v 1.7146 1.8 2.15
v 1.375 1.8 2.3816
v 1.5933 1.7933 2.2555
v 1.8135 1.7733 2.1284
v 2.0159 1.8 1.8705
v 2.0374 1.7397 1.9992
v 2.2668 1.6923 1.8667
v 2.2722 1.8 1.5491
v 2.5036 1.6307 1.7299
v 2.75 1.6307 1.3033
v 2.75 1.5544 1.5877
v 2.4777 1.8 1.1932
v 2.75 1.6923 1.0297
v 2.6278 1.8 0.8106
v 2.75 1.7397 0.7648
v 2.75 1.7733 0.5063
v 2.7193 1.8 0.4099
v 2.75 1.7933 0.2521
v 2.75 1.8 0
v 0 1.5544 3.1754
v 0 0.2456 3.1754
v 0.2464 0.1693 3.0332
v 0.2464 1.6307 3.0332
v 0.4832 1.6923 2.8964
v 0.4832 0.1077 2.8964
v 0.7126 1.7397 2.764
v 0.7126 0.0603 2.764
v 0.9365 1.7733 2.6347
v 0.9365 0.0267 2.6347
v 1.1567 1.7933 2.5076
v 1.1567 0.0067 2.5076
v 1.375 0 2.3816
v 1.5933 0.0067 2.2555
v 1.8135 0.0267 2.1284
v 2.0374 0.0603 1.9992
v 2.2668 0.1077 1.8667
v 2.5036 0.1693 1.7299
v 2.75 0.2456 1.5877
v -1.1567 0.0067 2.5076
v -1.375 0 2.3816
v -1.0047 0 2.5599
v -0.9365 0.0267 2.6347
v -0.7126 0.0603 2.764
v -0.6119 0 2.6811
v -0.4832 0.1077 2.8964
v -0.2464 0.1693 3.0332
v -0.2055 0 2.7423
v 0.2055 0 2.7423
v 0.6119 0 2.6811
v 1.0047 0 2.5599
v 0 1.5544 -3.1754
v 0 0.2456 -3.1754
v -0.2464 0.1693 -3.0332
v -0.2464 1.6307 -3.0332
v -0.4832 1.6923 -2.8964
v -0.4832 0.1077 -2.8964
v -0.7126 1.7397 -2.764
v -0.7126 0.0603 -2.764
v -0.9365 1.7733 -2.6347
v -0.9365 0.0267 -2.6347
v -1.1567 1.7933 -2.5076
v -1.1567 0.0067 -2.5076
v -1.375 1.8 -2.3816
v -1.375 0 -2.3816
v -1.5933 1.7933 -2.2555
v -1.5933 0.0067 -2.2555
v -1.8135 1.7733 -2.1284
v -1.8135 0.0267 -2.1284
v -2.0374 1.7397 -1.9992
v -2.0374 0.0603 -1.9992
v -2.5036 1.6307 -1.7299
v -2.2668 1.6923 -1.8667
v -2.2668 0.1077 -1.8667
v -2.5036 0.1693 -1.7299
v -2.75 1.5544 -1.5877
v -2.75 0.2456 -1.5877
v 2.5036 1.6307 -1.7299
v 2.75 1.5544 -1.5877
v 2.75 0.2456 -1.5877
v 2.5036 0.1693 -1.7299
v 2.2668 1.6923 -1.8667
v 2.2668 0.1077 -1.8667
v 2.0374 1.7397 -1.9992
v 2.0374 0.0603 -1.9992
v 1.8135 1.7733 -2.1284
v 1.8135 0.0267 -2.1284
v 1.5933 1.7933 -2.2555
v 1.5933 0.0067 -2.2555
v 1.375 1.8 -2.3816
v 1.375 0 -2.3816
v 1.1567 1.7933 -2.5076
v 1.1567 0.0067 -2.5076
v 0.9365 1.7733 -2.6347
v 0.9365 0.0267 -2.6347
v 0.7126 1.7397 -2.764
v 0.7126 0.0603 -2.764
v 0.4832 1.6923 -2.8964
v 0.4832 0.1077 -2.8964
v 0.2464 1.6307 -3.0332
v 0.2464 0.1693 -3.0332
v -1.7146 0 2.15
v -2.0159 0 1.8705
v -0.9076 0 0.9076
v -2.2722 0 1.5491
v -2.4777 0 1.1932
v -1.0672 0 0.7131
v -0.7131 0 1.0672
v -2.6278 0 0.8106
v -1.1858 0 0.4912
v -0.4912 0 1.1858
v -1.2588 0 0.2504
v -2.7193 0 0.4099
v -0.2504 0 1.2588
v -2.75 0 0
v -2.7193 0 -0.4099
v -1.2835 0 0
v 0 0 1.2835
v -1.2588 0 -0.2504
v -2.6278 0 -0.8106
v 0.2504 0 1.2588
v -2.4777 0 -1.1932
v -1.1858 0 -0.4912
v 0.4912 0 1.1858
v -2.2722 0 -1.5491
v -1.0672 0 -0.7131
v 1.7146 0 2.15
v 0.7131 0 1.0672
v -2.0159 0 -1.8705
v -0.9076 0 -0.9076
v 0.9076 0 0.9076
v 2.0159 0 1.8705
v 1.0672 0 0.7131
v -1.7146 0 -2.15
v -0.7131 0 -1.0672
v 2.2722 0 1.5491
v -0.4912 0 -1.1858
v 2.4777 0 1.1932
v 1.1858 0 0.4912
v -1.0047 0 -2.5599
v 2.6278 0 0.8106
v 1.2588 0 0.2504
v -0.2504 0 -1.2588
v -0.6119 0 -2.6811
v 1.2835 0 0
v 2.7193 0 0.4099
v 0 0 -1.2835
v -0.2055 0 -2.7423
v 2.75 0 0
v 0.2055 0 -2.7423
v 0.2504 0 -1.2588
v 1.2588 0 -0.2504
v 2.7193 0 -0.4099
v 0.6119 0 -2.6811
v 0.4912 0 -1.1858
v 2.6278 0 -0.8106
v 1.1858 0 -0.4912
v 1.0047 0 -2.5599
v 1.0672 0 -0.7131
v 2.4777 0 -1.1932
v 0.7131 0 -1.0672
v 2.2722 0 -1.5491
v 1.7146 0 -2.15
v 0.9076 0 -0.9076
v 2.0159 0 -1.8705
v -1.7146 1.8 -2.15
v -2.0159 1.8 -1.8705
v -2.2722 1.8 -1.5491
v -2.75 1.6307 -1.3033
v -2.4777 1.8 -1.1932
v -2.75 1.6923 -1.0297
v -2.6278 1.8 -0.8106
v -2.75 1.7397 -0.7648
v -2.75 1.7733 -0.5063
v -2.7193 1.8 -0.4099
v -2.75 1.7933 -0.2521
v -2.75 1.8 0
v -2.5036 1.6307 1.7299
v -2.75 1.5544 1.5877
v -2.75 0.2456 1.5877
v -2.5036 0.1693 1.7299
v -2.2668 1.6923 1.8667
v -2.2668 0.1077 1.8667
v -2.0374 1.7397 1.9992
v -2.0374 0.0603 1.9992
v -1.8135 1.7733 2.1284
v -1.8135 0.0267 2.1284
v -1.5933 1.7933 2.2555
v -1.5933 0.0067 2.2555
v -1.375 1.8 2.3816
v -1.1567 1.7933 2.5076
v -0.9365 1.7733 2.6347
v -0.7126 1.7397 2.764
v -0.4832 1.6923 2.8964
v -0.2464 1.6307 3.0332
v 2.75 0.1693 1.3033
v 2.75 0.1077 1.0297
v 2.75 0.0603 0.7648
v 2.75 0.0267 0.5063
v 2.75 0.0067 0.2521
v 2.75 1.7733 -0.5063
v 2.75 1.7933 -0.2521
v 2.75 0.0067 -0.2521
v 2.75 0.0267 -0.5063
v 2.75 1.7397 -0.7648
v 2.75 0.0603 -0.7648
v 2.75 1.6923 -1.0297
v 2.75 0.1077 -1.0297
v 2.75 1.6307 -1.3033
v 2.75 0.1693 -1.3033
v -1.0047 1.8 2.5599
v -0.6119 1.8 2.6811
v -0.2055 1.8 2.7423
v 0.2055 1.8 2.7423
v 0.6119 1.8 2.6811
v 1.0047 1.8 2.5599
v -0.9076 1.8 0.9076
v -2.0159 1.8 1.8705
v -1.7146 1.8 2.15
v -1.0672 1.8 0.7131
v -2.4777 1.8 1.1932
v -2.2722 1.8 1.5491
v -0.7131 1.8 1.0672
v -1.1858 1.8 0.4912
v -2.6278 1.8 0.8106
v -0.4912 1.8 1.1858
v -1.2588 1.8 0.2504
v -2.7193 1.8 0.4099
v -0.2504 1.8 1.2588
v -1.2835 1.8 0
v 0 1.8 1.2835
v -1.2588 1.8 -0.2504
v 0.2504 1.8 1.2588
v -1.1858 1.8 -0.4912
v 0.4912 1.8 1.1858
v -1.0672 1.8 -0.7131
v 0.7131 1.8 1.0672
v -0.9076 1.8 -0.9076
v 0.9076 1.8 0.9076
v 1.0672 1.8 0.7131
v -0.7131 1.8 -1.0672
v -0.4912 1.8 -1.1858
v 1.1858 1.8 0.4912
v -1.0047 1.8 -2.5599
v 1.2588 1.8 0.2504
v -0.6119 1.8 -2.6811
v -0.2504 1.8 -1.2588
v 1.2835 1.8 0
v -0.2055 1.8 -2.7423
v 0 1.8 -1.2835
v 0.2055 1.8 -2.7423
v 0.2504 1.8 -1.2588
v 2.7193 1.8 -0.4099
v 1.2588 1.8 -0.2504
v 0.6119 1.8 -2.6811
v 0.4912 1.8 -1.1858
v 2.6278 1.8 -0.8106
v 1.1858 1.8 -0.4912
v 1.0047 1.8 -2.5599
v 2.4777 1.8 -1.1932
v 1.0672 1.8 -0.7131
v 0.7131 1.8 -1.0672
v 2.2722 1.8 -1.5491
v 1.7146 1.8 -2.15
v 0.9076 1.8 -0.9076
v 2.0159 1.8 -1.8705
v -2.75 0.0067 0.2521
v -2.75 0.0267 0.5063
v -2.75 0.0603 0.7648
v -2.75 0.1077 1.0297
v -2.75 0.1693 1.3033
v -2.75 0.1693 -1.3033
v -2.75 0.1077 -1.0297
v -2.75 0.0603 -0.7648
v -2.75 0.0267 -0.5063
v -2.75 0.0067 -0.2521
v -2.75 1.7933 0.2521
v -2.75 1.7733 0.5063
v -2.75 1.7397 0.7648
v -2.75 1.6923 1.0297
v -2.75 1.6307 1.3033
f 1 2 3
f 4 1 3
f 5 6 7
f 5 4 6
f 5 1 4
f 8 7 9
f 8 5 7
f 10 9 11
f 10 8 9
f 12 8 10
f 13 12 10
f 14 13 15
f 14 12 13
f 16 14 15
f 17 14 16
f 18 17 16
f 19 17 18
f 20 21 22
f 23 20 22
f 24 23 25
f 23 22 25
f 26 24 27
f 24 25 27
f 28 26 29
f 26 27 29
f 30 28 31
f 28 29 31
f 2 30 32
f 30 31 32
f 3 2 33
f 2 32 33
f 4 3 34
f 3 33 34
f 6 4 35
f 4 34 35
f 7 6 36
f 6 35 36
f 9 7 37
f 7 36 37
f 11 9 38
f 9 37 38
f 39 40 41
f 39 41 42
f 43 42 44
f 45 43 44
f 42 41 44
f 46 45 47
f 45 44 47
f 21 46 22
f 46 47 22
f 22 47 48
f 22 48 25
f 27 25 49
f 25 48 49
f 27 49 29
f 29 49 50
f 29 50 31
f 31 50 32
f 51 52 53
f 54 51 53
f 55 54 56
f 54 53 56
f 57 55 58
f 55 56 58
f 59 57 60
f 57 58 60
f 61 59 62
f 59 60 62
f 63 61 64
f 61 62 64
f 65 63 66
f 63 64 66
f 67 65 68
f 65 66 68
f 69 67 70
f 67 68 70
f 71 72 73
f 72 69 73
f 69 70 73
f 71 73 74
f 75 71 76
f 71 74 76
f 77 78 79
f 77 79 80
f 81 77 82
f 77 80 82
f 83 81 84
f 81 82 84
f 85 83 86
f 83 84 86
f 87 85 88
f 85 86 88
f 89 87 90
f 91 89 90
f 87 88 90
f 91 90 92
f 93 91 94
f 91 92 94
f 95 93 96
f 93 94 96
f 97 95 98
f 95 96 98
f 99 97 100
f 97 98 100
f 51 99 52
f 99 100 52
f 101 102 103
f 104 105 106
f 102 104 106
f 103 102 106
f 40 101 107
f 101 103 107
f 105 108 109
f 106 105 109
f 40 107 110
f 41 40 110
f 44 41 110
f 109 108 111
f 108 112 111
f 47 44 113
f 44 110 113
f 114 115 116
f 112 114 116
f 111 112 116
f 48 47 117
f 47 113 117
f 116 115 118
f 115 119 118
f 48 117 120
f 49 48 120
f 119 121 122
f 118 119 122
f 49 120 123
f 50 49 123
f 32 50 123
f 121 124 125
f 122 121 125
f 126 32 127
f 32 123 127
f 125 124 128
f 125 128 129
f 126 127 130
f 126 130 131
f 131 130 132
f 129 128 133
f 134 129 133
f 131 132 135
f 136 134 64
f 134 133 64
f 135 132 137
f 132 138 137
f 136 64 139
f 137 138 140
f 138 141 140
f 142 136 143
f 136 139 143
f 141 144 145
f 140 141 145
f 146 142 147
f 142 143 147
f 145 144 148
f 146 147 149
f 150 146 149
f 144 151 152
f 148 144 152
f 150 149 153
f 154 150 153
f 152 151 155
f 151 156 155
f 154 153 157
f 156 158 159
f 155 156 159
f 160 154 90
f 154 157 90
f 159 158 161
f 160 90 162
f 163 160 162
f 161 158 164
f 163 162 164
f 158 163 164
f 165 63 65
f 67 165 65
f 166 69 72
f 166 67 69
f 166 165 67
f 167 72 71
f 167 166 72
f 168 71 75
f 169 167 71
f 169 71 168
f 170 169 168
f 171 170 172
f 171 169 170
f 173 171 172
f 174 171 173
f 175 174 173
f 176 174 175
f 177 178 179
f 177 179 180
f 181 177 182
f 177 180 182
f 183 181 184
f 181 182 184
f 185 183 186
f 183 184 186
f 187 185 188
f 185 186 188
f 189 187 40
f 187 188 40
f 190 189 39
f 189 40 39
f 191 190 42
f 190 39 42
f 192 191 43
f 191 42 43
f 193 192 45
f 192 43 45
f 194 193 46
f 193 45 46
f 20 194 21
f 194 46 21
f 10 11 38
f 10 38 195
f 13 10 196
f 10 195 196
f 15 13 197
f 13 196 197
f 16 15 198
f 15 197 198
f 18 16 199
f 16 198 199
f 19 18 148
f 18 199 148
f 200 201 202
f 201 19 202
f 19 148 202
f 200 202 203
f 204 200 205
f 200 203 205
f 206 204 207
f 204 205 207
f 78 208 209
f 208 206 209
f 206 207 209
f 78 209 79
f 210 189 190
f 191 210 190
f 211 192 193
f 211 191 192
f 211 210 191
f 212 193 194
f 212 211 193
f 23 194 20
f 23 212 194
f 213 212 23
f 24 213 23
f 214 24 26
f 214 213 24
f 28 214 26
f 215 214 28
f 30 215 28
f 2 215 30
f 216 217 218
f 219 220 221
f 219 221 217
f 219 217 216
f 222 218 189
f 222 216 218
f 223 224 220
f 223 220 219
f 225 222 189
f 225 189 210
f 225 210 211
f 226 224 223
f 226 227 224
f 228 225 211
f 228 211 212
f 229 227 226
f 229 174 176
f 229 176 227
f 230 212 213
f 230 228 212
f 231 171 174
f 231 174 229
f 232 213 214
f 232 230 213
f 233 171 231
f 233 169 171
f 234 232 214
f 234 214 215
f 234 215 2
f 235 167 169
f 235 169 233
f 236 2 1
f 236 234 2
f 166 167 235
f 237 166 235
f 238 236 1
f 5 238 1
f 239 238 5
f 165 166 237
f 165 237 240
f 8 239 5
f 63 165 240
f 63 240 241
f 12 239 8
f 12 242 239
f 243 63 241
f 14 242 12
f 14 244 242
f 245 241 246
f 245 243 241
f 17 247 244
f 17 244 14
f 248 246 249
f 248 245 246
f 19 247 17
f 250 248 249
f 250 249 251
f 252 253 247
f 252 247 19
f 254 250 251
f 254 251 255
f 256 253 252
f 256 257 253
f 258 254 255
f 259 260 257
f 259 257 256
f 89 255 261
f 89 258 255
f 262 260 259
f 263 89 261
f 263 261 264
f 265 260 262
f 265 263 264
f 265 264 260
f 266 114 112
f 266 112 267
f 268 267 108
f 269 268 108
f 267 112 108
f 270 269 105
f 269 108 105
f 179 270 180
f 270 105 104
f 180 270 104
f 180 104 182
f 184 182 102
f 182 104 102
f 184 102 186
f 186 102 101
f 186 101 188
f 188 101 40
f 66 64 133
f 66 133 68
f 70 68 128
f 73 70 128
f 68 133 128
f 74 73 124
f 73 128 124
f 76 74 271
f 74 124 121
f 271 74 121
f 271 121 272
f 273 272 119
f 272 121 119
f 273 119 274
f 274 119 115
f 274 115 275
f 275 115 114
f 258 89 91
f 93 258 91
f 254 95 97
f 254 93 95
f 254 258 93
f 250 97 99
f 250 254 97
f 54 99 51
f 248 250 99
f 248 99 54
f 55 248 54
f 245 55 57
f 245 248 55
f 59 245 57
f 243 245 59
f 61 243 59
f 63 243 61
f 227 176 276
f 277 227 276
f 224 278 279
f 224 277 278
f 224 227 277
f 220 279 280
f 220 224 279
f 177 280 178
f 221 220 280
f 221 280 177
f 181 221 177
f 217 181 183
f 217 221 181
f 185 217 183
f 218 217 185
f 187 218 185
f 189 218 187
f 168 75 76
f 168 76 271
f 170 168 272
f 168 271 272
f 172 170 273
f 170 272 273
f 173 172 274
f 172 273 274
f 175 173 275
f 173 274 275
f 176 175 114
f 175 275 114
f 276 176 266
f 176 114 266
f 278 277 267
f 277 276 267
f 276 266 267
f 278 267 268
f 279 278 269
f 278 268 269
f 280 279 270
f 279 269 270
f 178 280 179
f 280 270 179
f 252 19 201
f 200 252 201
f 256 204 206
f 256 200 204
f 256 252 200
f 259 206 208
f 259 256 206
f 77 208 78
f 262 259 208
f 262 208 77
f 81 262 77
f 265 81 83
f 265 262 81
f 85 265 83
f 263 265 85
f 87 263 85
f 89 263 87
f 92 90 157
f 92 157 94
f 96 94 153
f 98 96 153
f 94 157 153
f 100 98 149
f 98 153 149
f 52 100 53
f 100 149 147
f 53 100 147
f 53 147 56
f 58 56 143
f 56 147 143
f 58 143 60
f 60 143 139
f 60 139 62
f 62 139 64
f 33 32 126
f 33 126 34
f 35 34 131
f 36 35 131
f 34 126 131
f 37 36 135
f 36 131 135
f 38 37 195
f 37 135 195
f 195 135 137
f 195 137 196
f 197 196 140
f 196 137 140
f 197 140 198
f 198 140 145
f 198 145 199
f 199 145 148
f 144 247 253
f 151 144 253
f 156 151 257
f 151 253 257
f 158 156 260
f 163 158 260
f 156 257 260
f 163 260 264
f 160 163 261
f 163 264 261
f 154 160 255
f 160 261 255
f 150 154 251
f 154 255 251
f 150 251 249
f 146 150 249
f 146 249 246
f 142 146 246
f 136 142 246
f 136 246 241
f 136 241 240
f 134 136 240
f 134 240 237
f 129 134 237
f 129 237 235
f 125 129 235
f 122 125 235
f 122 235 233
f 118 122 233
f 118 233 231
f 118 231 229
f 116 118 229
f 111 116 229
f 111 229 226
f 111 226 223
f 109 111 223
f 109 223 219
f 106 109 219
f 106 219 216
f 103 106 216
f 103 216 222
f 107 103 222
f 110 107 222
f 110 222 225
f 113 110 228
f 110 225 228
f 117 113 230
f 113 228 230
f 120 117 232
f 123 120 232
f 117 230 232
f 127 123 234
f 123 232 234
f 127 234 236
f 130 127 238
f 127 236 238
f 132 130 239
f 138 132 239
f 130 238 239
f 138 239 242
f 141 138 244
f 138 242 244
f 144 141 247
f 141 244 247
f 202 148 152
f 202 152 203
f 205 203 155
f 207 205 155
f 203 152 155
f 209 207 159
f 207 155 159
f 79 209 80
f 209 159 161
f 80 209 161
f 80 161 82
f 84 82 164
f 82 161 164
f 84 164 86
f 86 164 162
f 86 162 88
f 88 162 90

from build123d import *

# Parameters (mm, degrees)
EXTRUDE_1_DEPTH     = 1.8
SKETCH_4_R          = 1.2835
CUT_EXTRUDE_1_DEPTH = 2.8


with BuildPart() as part:
    # 草图1 → 凸台-拉伸1 (new body)
    with BuildSketch(Plane(origin=(0, 0, 0), x_dir=(1, 0, 0), z_dir=(0, 1, 0))):
        Polygon((0, 3.175426481), (-2.75, 1.58771324), (-2.75, -1.58771324), (0, -3.175426481), (2.75, -1.58771324), (2.75, 1.58771324), align=None)
    extrude(amount=EXTRUDE_1_DEPTH)

    # 草图4 → 切除-拉伸1 (cut, through all)
    with BuildSketch(Plane(origin=(0, 1.8, 0), x_dir=(1, 0, 0), z_dir=(0, 1, 0))):
        Circle(SKETCH_4_R)
    extrude(amount=-CUT_EXTRUDE_1_DEPTH, mode=Mode.SUBTRACT)

    # 草图2 → 切除-旋转1 (revolve, cut)
    with BuildSketch(Plane(origin=(0, 0, 0), x_dir=(0, 0, -1), z_dir=(1, 0, 0))):
        Polygon((3.175426481, 1.8), (3.175426481, 1.554379907), (2.75, 1.8), align=None)
    revolve(axis=Axis((0, 0, 0), (0, 1, 0)), mode=Mode.SUBTRACT)

    # 草图3 → 切除-旋转2 (revolve, cut)
    with BuildSketch(Plane(origin=(0, 0, 0), x_dir=(0, 0, -1), z_dir=(1, 0, 0))):
        Polygon((3.175426481, 0), (3.175426481, 0.245620093), (2.75, 0), align=None)
    revolve(axis=Axis((0, 0, 0), (0, 1, 0)), mode=Mode.SUBTRACT)


solid = part.part
